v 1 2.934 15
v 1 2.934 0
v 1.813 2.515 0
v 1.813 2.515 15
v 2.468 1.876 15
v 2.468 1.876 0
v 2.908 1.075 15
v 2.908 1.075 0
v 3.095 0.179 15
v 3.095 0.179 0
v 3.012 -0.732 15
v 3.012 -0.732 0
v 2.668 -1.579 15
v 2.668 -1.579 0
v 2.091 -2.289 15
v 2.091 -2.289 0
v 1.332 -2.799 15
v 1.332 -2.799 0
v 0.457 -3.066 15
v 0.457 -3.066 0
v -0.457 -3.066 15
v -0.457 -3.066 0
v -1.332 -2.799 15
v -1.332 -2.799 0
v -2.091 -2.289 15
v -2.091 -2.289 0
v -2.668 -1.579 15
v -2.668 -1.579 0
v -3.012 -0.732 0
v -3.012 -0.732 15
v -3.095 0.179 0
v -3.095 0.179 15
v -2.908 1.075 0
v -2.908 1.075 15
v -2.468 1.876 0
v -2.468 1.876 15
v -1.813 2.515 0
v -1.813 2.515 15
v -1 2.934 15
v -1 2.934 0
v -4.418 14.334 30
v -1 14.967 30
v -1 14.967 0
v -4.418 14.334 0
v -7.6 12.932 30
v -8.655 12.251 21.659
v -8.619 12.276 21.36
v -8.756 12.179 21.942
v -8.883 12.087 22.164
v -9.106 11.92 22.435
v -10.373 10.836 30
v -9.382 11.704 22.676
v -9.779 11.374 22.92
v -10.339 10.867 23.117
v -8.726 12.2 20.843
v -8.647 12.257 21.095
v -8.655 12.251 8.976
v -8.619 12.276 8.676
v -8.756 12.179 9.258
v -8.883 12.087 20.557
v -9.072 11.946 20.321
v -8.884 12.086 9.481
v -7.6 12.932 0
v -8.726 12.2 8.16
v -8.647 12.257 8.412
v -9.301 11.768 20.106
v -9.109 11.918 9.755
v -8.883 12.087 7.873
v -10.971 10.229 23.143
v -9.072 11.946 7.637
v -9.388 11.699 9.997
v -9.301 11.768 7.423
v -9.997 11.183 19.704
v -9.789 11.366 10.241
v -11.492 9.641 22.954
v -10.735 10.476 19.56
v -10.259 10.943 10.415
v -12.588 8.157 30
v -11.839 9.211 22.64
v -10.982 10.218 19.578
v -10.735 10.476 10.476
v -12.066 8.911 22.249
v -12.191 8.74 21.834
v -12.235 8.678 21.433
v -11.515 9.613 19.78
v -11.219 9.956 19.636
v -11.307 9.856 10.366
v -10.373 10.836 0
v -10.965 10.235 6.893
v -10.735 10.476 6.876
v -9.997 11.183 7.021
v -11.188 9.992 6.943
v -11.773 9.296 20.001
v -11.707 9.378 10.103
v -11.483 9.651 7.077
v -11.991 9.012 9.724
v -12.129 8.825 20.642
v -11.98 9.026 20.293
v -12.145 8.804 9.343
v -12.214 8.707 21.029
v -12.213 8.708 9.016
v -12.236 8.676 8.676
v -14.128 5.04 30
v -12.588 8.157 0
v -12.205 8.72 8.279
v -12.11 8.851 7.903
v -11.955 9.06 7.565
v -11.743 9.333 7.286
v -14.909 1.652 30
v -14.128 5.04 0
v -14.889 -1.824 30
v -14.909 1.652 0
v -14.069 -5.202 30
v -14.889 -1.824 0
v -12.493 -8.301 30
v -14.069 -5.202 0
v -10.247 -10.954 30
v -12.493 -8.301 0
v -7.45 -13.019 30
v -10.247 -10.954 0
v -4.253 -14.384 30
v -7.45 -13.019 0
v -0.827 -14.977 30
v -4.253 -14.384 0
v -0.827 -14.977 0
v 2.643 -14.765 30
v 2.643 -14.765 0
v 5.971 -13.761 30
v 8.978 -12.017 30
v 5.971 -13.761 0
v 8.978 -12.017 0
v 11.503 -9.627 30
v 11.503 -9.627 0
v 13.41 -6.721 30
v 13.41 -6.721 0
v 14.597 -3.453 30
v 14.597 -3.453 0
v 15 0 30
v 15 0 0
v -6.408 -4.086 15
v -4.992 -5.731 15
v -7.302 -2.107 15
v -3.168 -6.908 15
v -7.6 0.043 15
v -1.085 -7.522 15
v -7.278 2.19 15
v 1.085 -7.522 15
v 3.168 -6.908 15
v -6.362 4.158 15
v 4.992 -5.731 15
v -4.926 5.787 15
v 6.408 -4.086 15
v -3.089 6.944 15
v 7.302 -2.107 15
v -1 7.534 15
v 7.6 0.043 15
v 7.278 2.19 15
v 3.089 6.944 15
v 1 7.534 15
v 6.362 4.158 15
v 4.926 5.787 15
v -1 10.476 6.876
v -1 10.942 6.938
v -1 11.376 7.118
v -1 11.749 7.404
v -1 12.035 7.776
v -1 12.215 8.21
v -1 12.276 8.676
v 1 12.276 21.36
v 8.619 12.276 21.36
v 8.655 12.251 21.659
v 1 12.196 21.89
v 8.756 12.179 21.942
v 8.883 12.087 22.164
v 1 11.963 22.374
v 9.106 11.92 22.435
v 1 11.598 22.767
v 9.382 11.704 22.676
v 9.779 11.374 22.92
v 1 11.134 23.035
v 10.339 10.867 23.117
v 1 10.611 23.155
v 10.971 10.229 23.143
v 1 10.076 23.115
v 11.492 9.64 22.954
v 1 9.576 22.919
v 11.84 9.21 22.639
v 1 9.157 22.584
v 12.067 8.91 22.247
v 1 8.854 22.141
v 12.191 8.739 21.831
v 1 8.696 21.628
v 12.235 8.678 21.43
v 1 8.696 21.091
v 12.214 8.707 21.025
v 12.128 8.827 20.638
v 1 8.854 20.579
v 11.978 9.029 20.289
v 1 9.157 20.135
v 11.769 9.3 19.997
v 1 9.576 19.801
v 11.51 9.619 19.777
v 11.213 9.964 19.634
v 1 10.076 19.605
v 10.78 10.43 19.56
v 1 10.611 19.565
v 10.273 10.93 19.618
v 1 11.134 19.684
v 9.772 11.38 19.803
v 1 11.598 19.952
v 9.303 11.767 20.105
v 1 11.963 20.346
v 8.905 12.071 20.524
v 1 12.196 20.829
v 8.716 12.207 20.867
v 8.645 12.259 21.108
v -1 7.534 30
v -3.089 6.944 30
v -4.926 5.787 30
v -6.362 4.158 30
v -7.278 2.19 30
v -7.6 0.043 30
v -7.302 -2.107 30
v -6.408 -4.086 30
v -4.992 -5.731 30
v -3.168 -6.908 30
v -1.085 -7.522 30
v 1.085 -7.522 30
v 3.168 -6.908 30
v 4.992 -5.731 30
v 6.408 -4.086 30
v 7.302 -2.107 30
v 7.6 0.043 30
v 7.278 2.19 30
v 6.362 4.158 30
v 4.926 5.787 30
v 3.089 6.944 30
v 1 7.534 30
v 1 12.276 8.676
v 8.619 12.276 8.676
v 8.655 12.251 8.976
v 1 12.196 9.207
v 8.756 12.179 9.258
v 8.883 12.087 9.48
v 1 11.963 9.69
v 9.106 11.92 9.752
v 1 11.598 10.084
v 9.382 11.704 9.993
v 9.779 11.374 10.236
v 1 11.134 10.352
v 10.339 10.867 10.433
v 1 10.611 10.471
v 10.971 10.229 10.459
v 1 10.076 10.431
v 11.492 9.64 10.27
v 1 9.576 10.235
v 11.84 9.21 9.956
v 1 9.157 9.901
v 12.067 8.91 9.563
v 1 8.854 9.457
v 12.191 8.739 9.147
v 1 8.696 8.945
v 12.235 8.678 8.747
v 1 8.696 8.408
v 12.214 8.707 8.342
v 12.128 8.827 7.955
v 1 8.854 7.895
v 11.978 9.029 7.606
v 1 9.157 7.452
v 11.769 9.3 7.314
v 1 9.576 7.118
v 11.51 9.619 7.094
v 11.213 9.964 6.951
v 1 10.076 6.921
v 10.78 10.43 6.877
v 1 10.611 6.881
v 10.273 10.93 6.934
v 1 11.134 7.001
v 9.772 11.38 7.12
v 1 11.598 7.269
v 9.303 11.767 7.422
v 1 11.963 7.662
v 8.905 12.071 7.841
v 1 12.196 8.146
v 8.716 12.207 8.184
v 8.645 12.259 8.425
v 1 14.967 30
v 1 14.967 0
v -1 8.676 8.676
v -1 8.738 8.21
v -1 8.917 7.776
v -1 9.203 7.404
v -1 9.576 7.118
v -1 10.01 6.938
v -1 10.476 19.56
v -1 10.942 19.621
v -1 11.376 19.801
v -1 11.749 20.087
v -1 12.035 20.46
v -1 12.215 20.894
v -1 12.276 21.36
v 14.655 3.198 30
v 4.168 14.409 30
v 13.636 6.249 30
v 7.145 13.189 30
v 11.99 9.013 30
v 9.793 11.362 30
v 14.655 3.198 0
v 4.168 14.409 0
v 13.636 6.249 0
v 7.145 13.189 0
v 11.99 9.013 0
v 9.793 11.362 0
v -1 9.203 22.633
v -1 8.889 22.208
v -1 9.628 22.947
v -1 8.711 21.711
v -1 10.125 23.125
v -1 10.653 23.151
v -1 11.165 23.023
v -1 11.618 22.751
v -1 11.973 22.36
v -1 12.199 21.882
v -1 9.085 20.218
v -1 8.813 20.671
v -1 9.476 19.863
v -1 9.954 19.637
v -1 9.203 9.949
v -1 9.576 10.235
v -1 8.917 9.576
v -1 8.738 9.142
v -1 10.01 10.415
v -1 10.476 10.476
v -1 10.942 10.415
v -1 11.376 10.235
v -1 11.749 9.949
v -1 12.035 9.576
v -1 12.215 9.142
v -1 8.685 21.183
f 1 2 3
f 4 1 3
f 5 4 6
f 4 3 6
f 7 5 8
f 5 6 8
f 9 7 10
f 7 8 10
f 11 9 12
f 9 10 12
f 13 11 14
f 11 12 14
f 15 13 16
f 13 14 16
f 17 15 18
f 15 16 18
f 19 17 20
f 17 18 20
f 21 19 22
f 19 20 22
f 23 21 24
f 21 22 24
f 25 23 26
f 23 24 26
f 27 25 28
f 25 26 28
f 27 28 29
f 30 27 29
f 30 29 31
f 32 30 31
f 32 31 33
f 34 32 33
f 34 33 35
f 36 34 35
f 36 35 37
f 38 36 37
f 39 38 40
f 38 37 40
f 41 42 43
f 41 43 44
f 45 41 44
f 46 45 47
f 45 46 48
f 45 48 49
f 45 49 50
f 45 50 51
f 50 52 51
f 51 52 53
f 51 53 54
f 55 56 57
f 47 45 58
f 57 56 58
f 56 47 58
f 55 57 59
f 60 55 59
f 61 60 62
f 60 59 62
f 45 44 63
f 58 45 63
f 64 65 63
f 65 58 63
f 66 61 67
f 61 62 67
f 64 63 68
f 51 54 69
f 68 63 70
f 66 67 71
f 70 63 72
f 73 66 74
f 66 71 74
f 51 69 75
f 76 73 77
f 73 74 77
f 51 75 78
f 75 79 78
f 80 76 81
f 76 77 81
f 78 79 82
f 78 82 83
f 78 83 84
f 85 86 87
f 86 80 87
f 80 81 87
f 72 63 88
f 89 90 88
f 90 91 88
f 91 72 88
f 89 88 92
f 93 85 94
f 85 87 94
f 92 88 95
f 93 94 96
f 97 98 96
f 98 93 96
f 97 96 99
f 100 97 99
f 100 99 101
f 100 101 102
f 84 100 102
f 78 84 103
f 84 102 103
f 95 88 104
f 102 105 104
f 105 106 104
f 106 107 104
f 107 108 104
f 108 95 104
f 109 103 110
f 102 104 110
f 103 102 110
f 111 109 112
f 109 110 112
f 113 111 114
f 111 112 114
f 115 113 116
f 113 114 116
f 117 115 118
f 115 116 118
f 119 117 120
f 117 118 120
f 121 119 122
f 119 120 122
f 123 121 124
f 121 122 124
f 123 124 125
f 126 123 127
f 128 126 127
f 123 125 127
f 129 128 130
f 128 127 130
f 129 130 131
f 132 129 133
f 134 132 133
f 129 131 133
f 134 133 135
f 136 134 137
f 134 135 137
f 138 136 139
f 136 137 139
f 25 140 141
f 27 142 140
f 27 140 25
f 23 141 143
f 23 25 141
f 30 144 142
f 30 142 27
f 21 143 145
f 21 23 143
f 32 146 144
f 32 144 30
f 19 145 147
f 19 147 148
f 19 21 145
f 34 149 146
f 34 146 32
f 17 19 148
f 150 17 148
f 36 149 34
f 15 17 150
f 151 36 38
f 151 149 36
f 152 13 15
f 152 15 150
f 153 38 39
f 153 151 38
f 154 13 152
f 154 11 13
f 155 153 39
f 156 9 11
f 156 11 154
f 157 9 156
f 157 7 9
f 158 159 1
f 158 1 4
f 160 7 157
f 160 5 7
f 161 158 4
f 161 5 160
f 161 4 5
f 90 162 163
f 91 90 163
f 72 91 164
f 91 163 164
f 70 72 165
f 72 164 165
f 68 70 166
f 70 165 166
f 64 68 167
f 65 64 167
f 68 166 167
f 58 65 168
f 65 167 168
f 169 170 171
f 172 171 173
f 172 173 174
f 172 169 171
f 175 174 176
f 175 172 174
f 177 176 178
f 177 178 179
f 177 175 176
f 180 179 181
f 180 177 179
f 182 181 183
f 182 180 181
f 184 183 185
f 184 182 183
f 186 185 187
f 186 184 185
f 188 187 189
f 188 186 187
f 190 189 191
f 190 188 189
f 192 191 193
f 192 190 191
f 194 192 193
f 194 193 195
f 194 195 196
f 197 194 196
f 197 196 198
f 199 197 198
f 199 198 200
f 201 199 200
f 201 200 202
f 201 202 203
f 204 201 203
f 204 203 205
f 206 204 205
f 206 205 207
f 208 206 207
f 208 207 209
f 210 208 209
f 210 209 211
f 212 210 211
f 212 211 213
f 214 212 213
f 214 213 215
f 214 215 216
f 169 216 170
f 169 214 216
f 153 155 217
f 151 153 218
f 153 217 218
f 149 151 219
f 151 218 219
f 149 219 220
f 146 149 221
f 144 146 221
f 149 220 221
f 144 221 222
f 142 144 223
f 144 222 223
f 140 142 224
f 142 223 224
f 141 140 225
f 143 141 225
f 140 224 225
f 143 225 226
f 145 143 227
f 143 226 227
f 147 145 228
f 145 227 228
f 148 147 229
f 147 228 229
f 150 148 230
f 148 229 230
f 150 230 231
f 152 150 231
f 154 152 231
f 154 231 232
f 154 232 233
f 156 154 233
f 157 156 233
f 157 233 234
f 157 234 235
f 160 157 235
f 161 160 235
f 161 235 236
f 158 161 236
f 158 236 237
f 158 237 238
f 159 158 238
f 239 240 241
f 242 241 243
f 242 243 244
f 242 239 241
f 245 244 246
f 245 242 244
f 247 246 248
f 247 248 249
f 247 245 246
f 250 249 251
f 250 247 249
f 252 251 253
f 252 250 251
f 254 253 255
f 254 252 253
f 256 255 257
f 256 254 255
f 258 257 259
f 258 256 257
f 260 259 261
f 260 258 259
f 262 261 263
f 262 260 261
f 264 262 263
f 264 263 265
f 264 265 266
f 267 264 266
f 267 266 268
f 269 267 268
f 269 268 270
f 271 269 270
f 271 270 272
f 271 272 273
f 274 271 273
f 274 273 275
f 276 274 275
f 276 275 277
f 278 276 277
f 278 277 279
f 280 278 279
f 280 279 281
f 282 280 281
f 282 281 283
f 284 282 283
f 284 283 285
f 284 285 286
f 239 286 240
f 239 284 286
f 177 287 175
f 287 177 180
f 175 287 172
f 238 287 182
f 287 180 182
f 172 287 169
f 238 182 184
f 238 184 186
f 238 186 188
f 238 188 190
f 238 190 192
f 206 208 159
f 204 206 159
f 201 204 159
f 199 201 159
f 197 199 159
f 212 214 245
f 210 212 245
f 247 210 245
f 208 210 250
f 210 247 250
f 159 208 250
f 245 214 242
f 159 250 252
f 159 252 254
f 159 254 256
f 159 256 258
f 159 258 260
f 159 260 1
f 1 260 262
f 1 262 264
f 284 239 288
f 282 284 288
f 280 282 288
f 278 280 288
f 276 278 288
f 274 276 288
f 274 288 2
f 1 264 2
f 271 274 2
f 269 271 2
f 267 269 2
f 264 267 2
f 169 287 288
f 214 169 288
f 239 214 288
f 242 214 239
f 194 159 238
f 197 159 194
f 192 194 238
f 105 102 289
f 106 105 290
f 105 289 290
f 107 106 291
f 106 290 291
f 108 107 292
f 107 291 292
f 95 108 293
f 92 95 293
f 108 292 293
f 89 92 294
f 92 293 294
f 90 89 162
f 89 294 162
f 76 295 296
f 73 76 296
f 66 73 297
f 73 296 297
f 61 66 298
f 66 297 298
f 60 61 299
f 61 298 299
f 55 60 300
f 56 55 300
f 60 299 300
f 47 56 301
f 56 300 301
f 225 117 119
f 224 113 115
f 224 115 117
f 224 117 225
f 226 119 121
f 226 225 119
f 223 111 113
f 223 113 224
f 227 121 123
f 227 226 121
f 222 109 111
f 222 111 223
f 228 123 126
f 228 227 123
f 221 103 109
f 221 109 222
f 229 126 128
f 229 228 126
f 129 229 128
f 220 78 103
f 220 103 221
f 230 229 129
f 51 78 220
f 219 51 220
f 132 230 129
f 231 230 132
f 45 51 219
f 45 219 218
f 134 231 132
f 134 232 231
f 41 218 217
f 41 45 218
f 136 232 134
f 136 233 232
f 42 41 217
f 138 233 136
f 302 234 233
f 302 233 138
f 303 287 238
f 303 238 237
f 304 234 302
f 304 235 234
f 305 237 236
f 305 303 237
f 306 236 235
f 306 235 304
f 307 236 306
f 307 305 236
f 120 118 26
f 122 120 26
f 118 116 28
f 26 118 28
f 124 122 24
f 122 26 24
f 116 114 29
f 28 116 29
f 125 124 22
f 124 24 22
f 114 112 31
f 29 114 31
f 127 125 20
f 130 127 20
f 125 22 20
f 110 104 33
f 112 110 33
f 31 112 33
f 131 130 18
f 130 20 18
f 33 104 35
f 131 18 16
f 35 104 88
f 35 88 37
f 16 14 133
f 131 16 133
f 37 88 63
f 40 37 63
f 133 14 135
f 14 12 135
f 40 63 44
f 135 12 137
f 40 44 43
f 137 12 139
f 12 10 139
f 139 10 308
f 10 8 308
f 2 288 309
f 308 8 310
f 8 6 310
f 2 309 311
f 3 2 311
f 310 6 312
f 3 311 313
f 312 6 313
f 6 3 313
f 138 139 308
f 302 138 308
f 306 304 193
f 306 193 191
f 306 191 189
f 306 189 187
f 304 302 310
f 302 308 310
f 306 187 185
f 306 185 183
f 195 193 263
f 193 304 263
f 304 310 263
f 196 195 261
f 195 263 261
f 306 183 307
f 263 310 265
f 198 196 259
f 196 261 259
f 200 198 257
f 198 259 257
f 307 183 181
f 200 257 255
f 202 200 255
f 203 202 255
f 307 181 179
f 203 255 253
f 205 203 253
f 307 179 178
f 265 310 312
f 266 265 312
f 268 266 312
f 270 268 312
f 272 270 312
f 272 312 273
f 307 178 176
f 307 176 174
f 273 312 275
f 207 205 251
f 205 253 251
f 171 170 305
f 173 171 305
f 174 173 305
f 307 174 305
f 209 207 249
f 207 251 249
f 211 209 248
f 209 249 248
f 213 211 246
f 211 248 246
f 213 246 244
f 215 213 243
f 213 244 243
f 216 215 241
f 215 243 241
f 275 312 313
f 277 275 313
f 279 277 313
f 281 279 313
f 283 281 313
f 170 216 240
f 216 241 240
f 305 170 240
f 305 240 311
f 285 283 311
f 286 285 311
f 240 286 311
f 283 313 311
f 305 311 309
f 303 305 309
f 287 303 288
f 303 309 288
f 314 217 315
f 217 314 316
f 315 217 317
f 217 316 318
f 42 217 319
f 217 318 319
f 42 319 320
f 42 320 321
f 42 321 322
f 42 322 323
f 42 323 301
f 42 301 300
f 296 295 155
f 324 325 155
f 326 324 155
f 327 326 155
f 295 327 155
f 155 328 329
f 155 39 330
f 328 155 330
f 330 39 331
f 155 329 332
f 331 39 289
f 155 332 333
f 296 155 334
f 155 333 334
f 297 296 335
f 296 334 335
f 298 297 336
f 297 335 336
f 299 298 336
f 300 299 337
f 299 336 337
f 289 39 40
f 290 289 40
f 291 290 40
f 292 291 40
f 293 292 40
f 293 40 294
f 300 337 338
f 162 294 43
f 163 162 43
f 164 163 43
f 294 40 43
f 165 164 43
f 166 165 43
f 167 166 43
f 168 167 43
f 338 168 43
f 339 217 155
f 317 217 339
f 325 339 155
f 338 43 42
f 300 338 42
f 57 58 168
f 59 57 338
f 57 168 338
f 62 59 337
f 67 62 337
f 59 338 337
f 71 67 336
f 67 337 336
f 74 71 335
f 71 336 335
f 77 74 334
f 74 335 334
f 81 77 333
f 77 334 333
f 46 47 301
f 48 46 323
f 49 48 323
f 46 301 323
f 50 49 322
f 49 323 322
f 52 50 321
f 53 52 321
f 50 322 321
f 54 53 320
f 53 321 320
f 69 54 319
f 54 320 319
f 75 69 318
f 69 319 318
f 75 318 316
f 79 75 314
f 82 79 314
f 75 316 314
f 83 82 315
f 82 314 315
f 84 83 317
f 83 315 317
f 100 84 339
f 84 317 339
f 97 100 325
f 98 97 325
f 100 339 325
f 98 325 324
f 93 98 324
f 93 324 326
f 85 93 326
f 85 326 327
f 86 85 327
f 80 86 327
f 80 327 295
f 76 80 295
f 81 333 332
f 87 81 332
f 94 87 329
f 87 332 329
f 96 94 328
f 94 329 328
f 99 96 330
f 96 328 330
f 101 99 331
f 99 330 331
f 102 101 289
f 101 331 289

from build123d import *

# Parameters (mm, degrees)
F0_R      = 15
F1_DEPTH  = 30
F2_R      = 7.6
F3_DEPTH  = 15
F4_R      = 3.1
F5_DEPTH  = 25.4
F7_DEPTH  = 50.8
F9_DEPTH  = 15.001
F10_R     = 1.8
F11_DEPTH = 25.4


with BuildPart() as f1:
    # F0 (on Top) → F1 (new body)
    with BuildSketch(Plane.XY):
        Circle(F0_R)
    extrude(amount=F1_DEPTH)

    # F2 (on face) → F3 (cut)
    with BuildSketch(Plane.XY.offset(30)):
        Circle(F2_R)
    extrude(amount=-F3_DEPTH, mode=Mode.SUBTRACT)

    # F4 (on face) → F5 (cut)
    with BuildSketch(Plane(origin=(0, 0, 0), x_dir=(1, 0, 0), z_dir=(0, 0, -1))):
        Circle(F4_R)
    extrude(amount=-F5_DEPTH, mode=Mode.SUBTRACT)

    # F6 (on face) → F7 (cut)
    with BuildSketch(Plane(origin=(0, 0, 0), x_dir=(1, 0, 0), z_dir=(0, 0, -1))):
        with BuildLine():
            Line((-1, -14.9666295471), (-1, -19.5340905339))
            Line((-1, -19.5340905339), (1, -19.5340905339))
            Line((1, -19.5340905339), (1, -14.9666295471))
            ThreePointArc((1, -14.9666295471), (0, -15), (-1, -14.9666295471))
        make_face()
        with BuildLine():
            Line((-1, 0), (-1, -2.9342801502))
            ThreePointArc((-1, -2.9342801502), (0, -3.1), (1, -2.9342801502))
            Line((1, -2.9342801502), (1, 0))
            Line((1, 0), (-1, 0))
        make_face()
        with BuildLine():
            Line((-1, -2.9342801502), (-1, -14.9666295471))
            ThreePointArc((-1, -14.9666295471), (0, -15), (1, -14.9666295471))
            Line((1, -14.9666295471), (1, -2.9342801502))
            ThreePointArc((1, -2.9342801502), (0, -3.1), (-1, -2.9342801502))
        make_face()
    extrude(amount=-F7_DEPTH, mode=Mode.SUBTRACT)

    # F8 (on Right) → F9 (cut, through all)
    with BuildSketch(Plane.YZ):
        with BuildLine():
            Line((10.4761691764, 8.6763631552), (10.4761691764, 6.8763631552))
            ThreePointArc((10.4761691764, 6.8763631552), (11.7489613825, 7.4035709491), (12.2761691764, 8.6763631552))
            ThreePointArc((12.2761691764, 8.6763631552), (11.7489613825, 9.9491553614), (10.4761691764, 10.4763631552))
            Line((10.4761691764, 10.4763631552), (10.4761691764, 8.6763631552))
        make_face()
        with BuildLine():
            ThreePointArc((10.4761691764, 10.4763631552), (9.2033769703, 9.9491553614), (8.6761691764, 8.6763631552))
            Line((8.6761691764, 8.6763631552), (10.4761691764, 8.6763631552))
            Line((10.4761691764, 8.6763631552), (10.4761691764, 10.4763631552))
        make_face()
        with BuildLine():
            ThreePointArc((8.6761691764, 8.6763631552), (9.2033769703, 7.4035709491), (10.4761691764, 6.8763631552))
            Line((10.4761691764, 6.8763631552), (10.4761691764, 8.6763631552))
            Line((10.4761691764, 8.6763631552), (8.6761691764, 8.6763631552))
        make_face()
        with BuildLine():
            ThreePointArc((12.2761691764, 21.3597174734), (9.2033769703, 22.6325096795), (10.4761691764, 19.5597174734))
            ThreePointArc((10.4761691764, 19.5597174734), (11.7489613825, 20.0869252673), (12.2761691764, 21.3597174734))
        make_face()
    extrude(amount=-F9_DEPTH, mode=Mode.SUBTRACT)

    # F10 (on face) → F11 (cut)
    with BuildSketch(Plane.YZ.offset(-1)):
        with Locations((10.4761691764, 8.6763631552)):
            Circle(F10_R)
        with Locations((10.4761691764, 21.3597174734)):
            Circle(F10_R)
    extrude(amount=F11_DEPTH, mode=Mode.SUBTRACT)


solid = f1.part
